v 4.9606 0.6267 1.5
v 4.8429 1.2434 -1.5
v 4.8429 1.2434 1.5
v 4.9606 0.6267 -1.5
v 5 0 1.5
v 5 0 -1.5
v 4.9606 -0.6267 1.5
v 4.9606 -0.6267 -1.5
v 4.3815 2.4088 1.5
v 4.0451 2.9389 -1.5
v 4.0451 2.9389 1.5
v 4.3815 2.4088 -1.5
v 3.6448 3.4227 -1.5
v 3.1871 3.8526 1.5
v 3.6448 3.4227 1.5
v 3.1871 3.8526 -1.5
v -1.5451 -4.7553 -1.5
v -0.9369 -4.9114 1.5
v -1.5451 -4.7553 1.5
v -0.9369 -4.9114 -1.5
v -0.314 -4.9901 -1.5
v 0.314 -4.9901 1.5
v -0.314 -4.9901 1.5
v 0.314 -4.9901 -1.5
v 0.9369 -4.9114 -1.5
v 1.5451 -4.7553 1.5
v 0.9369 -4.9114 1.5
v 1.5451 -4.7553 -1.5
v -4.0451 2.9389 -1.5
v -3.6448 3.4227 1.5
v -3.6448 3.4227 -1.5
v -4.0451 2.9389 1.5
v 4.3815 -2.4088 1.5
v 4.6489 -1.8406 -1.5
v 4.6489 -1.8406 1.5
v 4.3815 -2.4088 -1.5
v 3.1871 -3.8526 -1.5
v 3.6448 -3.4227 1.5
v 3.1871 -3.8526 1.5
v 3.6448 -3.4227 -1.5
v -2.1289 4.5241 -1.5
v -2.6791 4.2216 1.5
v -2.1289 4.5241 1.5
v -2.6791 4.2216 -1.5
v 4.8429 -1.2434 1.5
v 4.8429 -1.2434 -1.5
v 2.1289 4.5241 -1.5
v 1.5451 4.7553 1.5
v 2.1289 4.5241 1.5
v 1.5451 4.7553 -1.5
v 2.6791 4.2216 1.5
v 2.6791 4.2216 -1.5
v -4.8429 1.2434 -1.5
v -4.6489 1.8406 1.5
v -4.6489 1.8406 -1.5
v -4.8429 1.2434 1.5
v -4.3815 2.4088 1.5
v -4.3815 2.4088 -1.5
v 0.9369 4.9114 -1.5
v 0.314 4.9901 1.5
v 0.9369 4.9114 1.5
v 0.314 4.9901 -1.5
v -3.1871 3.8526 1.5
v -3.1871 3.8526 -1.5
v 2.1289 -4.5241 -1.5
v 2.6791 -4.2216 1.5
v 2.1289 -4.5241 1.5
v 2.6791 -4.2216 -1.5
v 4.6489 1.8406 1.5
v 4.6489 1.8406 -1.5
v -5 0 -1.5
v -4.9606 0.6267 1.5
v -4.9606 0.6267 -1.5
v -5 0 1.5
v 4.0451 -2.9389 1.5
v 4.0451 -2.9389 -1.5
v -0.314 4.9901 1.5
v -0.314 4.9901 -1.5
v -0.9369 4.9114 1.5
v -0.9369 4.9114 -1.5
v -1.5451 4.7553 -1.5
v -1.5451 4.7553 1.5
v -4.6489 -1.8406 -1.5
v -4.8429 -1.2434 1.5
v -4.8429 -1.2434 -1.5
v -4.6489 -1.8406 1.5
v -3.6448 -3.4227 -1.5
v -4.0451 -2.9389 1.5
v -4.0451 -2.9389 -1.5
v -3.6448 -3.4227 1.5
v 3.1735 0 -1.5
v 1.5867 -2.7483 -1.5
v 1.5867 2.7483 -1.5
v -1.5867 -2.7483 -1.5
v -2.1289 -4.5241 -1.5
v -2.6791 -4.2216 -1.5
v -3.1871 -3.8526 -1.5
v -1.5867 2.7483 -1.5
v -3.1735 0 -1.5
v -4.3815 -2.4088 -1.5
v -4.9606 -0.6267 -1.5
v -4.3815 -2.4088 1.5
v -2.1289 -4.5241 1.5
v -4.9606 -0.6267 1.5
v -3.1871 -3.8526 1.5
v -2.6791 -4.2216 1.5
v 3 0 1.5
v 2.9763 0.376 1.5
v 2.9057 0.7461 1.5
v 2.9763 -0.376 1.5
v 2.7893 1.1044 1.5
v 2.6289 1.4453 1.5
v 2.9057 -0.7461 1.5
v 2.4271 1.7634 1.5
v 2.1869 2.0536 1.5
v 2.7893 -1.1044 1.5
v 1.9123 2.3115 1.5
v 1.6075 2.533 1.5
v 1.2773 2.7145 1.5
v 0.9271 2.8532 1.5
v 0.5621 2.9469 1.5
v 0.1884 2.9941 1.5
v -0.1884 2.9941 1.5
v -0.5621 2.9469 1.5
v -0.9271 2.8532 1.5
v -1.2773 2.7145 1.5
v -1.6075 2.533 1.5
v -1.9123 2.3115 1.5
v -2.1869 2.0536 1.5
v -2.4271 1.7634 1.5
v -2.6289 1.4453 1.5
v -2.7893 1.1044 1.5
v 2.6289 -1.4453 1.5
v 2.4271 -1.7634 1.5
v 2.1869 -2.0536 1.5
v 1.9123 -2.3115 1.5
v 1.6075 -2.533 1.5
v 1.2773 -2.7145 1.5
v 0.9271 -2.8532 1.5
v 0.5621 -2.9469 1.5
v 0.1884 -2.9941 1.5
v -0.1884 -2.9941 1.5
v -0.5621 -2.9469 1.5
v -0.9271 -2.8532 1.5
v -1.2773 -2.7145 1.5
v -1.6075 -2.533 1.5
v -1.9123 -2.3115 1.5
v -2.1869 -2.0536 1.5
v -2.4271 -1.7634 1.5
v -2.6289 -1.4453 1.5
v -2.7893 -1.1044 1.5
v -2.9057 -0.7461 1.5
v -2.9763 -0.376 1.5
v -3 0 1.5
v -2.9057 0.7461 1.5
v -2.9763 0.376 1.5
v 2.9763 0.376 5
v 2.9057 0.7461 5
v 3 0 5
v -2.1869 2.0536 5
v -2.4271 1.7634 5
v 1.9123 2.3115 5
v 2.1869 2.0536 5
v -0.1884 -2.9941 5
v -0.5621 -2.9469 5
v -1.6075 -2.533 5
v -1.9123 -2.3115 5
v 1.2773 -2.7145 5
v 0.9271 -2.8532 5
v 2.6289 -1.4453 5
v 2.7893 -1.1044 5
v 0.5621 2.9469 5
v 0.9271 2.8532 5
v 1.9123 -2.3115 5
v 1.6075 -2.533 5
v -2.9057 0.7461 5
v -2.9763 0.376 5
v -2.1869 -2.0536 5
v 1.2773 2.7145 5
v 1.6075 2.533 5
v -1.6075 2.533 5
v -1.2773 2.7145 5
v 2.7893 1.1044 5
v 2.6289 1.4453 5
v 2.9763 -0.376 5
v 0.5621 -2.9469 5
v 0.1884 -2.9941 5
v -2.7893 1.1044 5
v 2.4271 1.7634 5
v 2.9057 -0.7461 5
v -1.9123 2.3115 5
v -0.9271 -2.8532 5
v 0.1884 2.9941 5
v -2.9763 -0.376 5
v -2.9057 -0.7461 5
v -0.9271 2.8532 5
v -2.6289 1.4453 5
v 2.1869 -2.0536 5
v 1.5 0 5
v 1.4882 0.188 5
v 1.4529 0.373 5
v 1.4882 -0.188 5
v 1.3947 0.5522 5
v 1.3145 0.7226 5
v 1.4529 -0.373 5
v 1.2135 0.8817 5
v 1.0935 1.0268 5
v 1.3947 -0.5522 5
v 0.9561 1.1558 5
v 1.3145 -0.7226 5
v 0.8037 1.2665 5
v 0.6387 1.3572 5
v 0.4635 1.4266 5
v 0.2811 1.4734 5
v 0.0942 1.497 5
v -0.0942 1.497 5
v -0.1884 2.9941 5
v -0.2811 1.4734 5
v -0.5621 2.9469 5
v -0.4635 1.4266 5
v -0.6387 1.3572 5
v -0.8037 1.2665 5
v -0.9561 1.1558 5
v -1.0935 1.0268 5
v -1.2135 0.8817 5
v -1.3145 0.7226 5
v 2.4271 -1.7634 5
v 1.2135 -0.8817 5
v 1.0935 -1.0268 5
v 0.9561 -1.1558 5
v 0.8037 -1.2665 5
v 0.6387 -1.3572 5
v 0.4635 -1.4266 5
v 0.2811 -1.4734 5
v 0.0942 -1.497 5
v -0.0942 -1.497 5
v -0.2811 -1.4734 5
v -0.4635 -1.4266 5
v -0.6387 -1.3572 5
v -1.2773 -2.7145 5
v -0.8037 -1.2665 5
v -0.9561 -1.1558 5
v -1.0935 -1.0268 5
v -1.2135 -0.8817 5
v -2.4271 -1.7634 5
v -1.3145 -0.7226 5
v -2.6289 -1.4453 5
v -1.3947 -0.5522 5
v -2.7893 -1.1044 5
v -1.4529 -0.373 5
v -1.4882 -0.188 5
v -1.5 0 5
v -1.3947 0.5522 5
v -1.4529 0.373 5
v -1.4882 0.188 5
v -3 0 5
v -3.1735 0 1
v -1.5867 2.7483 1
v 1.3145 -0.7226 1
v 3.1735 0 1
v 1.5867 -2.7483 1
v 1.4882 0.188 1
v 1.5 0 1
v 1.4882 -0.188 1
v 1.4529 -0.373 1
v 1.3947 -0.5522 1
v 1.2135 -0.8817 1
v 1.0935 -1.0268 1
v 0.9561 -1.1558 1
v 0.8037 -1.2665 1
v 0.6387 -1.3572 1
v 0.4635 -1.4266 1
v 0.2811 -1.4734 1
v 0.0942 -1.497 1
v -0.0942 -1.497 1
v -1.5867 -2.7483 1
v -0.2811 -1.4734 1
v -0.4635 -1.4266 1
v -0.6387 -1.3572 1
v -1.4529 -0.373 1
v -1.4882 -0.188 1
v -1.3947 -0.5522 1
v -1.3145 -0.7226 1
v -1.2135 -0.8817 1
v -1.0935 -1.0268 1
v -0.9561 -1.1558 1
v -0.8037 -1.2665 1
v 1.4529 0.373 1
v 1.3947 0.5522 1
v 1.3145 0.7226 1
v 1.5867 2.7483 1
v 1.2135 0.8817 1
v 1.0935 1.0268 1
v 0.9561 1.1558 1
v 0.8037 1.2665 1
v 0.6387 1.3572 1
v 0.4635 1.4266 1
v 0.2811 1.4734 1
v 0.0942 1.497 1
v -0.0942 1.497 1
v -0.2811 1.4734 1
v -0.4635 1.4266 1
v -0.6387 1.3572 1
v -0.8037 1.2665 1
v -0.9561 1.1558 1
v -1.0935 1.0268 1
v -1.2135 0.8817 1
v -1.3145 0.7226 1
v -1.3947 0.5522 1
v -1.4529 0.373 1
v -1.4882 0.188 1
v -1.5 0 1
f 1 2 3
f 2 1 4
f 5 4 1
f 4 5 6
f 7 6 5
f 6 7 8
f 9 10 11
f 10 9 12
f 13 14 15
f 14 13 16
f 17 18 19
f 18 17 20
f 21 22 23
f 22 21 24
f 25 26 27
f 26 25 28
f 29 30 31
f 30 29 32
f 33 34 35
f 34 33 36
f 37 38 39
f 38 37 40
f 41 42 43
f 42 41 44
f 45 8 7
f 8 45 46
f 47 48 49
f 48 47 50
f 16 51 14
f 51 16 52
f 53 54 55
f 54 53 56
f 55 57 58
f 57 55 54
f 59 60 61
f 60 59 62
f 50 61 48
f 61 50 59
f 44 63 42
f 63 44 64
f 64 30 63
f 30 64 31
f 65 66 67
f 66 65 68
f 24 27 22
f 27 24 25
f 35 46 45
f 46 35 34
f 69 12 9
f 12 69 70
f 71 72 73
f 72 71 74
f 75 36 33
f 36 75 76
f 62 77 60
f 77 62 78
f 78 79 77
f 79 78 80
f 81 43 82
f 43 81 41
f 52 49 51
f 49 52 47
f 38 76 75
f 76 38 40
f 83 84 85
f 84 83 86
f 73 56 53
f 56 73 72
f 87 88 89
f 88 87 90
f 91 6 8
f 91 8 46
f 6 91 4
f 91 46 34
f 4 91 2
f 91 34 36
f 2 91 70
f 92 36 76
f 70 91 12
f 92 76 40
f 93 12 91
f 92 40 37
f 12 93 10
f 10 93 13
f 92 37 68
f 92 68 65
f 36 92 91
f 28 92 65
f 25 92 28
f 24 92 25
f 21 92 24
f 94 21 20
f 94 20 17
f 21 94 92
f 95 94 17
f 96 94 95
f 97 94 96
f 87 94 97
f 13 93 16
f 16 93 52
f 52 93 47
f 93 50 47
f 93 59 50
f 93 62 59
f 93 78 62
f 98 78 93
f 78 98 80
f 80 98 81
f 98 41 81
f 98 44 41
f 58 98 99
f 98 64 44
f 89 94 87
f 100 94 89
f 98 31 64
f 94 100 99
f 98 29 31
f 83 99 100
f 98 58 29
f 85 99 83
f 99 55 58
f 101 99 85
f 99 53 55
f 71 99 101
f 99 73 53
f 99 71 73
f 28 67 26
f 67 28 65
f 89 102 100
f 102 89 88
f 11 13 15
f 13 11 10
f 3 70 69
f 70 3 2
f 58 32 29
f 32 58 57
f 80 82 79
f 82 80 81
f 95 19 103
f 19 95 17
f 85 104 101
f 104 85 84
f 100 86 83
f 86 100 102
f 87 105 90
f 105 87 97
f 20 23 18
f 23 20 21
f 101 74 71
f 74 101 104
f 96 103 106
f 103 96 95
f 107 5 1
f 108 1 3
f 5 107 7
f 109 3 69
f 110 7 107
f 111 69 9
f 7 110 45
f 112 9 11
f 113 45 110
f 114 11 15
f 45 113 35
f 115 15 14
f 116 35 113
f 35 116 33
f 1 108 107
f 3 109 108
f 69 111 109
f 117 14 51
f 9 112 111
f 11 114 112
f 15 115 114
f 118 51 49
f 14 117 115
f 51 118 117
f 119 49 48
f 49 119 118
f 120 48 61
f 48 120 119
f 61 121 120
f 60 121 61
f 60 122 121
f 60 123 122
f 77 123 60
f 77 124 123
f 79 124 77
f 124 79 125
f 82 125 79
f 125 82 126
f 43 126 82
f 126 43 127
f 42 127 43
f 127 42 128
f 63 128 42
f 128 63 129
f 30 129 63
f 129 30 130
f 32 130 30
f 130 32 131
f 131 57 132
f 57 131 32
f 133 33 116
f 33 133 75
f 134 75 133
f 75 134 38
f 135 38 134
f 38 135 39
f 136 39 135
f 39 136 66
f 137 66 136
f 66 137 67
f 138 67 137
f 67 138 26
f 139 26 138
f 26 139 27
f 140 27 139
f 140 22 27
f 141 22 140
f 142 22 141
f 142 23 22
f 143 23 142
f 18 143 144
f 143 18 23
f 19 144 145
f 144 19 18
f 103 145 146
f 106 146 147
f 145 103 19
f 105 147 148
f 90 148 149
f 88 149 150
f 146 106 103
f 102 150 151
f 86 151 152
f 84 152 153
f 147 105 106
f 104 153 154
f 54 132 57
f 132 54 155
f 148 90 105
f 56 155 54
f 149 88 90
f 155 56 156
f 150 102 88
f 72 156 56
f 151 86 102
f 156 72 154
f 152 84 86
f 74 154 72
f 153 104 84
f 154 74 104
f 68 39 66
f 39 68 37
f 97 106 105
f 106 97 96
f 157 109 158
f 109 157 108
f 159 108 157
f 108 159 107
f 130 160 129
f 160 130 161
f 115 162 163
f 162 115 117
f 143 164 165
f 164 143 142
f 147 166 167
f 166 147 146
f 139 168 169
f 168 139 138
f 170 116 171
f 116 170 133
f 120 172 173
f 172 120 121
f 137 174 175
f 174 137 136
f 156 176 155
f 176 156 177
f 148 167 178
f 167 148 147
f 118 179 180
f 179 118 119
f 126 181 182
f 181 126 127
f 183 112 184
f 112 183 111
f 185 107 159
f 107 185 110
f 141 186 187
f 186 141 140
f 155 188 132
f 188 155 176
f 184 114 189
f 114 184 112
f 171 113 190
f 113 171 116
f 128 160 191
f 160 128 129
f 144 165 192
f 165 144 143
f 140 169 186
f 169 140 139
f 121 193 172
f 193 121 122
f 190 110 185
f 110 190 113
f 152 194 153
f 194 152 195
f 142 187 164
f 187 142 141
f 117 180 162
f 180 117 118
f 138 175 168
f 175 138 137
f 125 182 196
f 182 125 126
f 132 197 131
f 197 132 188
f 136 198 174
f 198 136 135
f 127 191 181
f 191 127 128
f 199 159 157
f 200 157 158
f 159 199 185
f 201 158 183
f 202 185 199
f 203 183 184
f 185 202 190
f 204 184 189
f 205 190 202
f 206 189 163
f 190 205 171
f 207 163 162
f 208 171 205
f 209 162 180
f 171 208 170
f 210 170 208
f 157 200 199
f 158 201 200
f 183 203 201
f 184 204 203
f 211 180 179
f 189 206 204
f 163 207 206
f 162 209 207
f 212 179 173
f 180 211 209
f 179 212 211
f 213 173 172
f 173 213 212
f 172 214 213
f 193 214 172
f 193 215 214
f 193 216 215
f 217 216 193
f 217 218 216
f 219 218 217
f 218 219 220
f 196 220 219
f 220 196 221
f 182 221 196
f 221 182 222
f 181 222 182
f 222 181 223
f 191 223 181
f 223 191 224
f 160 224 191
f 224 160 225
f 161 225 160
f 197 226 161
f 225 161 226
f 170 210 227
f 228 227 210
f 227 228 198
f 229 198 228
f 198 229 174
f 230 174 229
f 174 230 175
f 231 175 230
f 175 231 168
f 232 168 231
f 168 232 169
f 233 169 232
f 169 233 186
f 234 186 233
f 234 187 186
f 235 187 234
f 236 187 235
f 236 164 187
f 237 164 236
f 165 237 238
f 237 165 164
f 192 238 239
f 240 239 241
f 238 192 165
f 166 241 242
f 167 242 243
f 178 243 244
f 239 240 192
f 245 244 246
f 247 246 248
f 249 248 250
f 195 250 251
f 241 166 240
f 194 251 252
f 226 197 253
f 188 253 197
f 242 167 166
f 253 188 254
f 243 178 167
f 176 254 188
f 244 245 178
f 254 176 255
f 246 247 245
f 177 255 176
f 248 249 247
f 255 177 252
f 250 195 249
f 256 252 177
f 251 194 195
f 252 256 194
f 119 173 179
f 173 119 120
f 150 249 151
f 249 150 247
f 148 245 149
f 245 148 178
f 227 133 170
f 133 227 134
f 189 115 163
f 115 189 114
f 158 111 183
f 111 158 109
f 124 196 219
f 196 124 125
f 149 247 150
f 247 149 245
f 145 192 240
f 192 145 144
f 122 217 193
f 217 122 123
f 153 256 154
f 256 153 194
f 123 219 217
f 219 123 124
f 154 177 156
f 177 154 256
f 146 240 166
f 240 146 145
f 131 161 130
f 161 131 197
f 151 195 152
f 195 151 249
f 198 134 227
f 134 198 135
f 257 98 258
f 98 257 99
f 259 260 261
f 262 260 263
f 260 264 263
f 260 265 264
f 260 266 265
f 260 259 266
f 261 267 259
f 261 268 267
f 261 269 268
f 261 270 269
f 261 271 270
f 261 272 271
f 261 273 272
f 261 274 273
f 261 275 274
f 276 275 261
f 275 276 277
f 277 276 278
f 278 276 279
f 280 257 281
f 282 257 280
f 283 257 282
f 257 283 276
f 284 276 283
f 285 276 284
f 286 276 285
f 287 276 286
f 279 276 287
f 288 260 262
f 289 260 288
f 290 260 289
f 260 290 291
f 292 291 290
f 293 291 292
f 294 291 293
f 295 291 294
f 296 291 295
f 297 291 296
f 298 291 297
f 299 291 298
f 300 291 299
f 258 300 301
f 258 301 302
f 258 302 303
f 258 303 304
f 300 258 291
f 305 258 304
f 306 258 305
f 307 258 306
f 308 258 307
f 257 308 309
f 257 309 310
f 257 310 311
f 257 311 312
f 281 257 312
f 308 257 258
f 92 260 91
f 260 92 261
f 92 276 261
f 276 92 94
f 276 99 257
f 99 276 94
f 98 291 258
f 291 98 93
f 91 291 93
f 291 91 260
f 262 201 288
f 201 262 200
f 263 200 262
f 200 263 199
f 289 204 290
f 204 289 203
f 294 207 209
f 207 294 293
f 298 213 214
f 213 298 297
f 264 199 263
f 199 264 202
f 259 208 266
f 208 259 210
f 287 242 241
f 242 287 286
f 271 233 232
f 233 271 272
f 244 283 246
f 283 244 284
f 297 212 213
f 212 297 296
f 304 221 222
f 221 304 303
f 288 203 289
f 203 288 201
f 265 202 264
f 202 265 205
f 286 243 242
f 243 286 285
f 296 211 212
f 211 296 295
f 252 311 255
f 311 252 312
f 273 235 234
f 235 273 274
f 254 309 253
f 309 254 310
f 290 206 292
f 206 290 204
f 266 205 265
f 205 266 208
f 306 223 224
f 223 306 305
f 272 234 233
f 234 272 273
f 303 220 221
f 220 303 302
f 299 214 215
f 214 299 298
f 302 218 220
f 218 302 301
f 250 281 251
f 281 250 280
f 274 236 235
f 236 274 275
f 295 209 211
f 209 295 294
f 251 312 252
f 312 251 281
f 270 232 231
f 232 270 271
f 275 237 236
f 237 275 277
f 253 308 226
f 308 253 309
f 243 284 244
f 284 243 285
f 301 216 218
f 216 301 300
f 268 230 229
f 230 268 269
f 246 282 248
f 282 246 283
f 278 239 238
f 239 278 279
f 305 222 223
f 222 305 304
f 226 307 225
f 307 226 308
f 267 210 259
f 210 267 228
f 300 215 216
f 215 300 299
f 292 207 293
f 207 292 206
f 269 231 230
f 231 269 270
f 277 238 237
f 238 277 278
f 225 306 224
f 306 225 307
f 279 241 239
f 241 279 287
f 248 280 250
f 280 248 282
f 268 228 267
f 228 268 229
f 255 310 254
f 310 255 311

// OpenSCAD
$fn = 50;


difference() {
	union() {
		translate(v = [0, 0, -1.5000000000]) {
			cylinder(h = 3, r = 5.0000000000);
		}
		translate(v = [0, 0, -1.5000000000]) {
			cylinder(h = 6.5000000000, r = 3.0000000000);
		}
	}
	union() {
		translate(v = [0, 0, -1.5000000000]) {
			rotate(a = [0, 0, 0]) {
				difference() {
					union() {
						#linear_extrude(height = 2.5000000000) {
							polygon(points = [[3.1735000000, 0.0000000000], [1.5867500000, 2.7483316189], [-1.5867500000, 2.7483316189], [-3.1735000000, 0.0000000000], [-1.5867500000, -2.7483316189], [1.5867500000, -2.7483316189]]);
						}
					}
					union();
				}
			}
		}
		translate(v = [0, 0, -50.0000000000]) {
			cylinder(h = 100, r = 1.5000000000);
		}
	}
}
